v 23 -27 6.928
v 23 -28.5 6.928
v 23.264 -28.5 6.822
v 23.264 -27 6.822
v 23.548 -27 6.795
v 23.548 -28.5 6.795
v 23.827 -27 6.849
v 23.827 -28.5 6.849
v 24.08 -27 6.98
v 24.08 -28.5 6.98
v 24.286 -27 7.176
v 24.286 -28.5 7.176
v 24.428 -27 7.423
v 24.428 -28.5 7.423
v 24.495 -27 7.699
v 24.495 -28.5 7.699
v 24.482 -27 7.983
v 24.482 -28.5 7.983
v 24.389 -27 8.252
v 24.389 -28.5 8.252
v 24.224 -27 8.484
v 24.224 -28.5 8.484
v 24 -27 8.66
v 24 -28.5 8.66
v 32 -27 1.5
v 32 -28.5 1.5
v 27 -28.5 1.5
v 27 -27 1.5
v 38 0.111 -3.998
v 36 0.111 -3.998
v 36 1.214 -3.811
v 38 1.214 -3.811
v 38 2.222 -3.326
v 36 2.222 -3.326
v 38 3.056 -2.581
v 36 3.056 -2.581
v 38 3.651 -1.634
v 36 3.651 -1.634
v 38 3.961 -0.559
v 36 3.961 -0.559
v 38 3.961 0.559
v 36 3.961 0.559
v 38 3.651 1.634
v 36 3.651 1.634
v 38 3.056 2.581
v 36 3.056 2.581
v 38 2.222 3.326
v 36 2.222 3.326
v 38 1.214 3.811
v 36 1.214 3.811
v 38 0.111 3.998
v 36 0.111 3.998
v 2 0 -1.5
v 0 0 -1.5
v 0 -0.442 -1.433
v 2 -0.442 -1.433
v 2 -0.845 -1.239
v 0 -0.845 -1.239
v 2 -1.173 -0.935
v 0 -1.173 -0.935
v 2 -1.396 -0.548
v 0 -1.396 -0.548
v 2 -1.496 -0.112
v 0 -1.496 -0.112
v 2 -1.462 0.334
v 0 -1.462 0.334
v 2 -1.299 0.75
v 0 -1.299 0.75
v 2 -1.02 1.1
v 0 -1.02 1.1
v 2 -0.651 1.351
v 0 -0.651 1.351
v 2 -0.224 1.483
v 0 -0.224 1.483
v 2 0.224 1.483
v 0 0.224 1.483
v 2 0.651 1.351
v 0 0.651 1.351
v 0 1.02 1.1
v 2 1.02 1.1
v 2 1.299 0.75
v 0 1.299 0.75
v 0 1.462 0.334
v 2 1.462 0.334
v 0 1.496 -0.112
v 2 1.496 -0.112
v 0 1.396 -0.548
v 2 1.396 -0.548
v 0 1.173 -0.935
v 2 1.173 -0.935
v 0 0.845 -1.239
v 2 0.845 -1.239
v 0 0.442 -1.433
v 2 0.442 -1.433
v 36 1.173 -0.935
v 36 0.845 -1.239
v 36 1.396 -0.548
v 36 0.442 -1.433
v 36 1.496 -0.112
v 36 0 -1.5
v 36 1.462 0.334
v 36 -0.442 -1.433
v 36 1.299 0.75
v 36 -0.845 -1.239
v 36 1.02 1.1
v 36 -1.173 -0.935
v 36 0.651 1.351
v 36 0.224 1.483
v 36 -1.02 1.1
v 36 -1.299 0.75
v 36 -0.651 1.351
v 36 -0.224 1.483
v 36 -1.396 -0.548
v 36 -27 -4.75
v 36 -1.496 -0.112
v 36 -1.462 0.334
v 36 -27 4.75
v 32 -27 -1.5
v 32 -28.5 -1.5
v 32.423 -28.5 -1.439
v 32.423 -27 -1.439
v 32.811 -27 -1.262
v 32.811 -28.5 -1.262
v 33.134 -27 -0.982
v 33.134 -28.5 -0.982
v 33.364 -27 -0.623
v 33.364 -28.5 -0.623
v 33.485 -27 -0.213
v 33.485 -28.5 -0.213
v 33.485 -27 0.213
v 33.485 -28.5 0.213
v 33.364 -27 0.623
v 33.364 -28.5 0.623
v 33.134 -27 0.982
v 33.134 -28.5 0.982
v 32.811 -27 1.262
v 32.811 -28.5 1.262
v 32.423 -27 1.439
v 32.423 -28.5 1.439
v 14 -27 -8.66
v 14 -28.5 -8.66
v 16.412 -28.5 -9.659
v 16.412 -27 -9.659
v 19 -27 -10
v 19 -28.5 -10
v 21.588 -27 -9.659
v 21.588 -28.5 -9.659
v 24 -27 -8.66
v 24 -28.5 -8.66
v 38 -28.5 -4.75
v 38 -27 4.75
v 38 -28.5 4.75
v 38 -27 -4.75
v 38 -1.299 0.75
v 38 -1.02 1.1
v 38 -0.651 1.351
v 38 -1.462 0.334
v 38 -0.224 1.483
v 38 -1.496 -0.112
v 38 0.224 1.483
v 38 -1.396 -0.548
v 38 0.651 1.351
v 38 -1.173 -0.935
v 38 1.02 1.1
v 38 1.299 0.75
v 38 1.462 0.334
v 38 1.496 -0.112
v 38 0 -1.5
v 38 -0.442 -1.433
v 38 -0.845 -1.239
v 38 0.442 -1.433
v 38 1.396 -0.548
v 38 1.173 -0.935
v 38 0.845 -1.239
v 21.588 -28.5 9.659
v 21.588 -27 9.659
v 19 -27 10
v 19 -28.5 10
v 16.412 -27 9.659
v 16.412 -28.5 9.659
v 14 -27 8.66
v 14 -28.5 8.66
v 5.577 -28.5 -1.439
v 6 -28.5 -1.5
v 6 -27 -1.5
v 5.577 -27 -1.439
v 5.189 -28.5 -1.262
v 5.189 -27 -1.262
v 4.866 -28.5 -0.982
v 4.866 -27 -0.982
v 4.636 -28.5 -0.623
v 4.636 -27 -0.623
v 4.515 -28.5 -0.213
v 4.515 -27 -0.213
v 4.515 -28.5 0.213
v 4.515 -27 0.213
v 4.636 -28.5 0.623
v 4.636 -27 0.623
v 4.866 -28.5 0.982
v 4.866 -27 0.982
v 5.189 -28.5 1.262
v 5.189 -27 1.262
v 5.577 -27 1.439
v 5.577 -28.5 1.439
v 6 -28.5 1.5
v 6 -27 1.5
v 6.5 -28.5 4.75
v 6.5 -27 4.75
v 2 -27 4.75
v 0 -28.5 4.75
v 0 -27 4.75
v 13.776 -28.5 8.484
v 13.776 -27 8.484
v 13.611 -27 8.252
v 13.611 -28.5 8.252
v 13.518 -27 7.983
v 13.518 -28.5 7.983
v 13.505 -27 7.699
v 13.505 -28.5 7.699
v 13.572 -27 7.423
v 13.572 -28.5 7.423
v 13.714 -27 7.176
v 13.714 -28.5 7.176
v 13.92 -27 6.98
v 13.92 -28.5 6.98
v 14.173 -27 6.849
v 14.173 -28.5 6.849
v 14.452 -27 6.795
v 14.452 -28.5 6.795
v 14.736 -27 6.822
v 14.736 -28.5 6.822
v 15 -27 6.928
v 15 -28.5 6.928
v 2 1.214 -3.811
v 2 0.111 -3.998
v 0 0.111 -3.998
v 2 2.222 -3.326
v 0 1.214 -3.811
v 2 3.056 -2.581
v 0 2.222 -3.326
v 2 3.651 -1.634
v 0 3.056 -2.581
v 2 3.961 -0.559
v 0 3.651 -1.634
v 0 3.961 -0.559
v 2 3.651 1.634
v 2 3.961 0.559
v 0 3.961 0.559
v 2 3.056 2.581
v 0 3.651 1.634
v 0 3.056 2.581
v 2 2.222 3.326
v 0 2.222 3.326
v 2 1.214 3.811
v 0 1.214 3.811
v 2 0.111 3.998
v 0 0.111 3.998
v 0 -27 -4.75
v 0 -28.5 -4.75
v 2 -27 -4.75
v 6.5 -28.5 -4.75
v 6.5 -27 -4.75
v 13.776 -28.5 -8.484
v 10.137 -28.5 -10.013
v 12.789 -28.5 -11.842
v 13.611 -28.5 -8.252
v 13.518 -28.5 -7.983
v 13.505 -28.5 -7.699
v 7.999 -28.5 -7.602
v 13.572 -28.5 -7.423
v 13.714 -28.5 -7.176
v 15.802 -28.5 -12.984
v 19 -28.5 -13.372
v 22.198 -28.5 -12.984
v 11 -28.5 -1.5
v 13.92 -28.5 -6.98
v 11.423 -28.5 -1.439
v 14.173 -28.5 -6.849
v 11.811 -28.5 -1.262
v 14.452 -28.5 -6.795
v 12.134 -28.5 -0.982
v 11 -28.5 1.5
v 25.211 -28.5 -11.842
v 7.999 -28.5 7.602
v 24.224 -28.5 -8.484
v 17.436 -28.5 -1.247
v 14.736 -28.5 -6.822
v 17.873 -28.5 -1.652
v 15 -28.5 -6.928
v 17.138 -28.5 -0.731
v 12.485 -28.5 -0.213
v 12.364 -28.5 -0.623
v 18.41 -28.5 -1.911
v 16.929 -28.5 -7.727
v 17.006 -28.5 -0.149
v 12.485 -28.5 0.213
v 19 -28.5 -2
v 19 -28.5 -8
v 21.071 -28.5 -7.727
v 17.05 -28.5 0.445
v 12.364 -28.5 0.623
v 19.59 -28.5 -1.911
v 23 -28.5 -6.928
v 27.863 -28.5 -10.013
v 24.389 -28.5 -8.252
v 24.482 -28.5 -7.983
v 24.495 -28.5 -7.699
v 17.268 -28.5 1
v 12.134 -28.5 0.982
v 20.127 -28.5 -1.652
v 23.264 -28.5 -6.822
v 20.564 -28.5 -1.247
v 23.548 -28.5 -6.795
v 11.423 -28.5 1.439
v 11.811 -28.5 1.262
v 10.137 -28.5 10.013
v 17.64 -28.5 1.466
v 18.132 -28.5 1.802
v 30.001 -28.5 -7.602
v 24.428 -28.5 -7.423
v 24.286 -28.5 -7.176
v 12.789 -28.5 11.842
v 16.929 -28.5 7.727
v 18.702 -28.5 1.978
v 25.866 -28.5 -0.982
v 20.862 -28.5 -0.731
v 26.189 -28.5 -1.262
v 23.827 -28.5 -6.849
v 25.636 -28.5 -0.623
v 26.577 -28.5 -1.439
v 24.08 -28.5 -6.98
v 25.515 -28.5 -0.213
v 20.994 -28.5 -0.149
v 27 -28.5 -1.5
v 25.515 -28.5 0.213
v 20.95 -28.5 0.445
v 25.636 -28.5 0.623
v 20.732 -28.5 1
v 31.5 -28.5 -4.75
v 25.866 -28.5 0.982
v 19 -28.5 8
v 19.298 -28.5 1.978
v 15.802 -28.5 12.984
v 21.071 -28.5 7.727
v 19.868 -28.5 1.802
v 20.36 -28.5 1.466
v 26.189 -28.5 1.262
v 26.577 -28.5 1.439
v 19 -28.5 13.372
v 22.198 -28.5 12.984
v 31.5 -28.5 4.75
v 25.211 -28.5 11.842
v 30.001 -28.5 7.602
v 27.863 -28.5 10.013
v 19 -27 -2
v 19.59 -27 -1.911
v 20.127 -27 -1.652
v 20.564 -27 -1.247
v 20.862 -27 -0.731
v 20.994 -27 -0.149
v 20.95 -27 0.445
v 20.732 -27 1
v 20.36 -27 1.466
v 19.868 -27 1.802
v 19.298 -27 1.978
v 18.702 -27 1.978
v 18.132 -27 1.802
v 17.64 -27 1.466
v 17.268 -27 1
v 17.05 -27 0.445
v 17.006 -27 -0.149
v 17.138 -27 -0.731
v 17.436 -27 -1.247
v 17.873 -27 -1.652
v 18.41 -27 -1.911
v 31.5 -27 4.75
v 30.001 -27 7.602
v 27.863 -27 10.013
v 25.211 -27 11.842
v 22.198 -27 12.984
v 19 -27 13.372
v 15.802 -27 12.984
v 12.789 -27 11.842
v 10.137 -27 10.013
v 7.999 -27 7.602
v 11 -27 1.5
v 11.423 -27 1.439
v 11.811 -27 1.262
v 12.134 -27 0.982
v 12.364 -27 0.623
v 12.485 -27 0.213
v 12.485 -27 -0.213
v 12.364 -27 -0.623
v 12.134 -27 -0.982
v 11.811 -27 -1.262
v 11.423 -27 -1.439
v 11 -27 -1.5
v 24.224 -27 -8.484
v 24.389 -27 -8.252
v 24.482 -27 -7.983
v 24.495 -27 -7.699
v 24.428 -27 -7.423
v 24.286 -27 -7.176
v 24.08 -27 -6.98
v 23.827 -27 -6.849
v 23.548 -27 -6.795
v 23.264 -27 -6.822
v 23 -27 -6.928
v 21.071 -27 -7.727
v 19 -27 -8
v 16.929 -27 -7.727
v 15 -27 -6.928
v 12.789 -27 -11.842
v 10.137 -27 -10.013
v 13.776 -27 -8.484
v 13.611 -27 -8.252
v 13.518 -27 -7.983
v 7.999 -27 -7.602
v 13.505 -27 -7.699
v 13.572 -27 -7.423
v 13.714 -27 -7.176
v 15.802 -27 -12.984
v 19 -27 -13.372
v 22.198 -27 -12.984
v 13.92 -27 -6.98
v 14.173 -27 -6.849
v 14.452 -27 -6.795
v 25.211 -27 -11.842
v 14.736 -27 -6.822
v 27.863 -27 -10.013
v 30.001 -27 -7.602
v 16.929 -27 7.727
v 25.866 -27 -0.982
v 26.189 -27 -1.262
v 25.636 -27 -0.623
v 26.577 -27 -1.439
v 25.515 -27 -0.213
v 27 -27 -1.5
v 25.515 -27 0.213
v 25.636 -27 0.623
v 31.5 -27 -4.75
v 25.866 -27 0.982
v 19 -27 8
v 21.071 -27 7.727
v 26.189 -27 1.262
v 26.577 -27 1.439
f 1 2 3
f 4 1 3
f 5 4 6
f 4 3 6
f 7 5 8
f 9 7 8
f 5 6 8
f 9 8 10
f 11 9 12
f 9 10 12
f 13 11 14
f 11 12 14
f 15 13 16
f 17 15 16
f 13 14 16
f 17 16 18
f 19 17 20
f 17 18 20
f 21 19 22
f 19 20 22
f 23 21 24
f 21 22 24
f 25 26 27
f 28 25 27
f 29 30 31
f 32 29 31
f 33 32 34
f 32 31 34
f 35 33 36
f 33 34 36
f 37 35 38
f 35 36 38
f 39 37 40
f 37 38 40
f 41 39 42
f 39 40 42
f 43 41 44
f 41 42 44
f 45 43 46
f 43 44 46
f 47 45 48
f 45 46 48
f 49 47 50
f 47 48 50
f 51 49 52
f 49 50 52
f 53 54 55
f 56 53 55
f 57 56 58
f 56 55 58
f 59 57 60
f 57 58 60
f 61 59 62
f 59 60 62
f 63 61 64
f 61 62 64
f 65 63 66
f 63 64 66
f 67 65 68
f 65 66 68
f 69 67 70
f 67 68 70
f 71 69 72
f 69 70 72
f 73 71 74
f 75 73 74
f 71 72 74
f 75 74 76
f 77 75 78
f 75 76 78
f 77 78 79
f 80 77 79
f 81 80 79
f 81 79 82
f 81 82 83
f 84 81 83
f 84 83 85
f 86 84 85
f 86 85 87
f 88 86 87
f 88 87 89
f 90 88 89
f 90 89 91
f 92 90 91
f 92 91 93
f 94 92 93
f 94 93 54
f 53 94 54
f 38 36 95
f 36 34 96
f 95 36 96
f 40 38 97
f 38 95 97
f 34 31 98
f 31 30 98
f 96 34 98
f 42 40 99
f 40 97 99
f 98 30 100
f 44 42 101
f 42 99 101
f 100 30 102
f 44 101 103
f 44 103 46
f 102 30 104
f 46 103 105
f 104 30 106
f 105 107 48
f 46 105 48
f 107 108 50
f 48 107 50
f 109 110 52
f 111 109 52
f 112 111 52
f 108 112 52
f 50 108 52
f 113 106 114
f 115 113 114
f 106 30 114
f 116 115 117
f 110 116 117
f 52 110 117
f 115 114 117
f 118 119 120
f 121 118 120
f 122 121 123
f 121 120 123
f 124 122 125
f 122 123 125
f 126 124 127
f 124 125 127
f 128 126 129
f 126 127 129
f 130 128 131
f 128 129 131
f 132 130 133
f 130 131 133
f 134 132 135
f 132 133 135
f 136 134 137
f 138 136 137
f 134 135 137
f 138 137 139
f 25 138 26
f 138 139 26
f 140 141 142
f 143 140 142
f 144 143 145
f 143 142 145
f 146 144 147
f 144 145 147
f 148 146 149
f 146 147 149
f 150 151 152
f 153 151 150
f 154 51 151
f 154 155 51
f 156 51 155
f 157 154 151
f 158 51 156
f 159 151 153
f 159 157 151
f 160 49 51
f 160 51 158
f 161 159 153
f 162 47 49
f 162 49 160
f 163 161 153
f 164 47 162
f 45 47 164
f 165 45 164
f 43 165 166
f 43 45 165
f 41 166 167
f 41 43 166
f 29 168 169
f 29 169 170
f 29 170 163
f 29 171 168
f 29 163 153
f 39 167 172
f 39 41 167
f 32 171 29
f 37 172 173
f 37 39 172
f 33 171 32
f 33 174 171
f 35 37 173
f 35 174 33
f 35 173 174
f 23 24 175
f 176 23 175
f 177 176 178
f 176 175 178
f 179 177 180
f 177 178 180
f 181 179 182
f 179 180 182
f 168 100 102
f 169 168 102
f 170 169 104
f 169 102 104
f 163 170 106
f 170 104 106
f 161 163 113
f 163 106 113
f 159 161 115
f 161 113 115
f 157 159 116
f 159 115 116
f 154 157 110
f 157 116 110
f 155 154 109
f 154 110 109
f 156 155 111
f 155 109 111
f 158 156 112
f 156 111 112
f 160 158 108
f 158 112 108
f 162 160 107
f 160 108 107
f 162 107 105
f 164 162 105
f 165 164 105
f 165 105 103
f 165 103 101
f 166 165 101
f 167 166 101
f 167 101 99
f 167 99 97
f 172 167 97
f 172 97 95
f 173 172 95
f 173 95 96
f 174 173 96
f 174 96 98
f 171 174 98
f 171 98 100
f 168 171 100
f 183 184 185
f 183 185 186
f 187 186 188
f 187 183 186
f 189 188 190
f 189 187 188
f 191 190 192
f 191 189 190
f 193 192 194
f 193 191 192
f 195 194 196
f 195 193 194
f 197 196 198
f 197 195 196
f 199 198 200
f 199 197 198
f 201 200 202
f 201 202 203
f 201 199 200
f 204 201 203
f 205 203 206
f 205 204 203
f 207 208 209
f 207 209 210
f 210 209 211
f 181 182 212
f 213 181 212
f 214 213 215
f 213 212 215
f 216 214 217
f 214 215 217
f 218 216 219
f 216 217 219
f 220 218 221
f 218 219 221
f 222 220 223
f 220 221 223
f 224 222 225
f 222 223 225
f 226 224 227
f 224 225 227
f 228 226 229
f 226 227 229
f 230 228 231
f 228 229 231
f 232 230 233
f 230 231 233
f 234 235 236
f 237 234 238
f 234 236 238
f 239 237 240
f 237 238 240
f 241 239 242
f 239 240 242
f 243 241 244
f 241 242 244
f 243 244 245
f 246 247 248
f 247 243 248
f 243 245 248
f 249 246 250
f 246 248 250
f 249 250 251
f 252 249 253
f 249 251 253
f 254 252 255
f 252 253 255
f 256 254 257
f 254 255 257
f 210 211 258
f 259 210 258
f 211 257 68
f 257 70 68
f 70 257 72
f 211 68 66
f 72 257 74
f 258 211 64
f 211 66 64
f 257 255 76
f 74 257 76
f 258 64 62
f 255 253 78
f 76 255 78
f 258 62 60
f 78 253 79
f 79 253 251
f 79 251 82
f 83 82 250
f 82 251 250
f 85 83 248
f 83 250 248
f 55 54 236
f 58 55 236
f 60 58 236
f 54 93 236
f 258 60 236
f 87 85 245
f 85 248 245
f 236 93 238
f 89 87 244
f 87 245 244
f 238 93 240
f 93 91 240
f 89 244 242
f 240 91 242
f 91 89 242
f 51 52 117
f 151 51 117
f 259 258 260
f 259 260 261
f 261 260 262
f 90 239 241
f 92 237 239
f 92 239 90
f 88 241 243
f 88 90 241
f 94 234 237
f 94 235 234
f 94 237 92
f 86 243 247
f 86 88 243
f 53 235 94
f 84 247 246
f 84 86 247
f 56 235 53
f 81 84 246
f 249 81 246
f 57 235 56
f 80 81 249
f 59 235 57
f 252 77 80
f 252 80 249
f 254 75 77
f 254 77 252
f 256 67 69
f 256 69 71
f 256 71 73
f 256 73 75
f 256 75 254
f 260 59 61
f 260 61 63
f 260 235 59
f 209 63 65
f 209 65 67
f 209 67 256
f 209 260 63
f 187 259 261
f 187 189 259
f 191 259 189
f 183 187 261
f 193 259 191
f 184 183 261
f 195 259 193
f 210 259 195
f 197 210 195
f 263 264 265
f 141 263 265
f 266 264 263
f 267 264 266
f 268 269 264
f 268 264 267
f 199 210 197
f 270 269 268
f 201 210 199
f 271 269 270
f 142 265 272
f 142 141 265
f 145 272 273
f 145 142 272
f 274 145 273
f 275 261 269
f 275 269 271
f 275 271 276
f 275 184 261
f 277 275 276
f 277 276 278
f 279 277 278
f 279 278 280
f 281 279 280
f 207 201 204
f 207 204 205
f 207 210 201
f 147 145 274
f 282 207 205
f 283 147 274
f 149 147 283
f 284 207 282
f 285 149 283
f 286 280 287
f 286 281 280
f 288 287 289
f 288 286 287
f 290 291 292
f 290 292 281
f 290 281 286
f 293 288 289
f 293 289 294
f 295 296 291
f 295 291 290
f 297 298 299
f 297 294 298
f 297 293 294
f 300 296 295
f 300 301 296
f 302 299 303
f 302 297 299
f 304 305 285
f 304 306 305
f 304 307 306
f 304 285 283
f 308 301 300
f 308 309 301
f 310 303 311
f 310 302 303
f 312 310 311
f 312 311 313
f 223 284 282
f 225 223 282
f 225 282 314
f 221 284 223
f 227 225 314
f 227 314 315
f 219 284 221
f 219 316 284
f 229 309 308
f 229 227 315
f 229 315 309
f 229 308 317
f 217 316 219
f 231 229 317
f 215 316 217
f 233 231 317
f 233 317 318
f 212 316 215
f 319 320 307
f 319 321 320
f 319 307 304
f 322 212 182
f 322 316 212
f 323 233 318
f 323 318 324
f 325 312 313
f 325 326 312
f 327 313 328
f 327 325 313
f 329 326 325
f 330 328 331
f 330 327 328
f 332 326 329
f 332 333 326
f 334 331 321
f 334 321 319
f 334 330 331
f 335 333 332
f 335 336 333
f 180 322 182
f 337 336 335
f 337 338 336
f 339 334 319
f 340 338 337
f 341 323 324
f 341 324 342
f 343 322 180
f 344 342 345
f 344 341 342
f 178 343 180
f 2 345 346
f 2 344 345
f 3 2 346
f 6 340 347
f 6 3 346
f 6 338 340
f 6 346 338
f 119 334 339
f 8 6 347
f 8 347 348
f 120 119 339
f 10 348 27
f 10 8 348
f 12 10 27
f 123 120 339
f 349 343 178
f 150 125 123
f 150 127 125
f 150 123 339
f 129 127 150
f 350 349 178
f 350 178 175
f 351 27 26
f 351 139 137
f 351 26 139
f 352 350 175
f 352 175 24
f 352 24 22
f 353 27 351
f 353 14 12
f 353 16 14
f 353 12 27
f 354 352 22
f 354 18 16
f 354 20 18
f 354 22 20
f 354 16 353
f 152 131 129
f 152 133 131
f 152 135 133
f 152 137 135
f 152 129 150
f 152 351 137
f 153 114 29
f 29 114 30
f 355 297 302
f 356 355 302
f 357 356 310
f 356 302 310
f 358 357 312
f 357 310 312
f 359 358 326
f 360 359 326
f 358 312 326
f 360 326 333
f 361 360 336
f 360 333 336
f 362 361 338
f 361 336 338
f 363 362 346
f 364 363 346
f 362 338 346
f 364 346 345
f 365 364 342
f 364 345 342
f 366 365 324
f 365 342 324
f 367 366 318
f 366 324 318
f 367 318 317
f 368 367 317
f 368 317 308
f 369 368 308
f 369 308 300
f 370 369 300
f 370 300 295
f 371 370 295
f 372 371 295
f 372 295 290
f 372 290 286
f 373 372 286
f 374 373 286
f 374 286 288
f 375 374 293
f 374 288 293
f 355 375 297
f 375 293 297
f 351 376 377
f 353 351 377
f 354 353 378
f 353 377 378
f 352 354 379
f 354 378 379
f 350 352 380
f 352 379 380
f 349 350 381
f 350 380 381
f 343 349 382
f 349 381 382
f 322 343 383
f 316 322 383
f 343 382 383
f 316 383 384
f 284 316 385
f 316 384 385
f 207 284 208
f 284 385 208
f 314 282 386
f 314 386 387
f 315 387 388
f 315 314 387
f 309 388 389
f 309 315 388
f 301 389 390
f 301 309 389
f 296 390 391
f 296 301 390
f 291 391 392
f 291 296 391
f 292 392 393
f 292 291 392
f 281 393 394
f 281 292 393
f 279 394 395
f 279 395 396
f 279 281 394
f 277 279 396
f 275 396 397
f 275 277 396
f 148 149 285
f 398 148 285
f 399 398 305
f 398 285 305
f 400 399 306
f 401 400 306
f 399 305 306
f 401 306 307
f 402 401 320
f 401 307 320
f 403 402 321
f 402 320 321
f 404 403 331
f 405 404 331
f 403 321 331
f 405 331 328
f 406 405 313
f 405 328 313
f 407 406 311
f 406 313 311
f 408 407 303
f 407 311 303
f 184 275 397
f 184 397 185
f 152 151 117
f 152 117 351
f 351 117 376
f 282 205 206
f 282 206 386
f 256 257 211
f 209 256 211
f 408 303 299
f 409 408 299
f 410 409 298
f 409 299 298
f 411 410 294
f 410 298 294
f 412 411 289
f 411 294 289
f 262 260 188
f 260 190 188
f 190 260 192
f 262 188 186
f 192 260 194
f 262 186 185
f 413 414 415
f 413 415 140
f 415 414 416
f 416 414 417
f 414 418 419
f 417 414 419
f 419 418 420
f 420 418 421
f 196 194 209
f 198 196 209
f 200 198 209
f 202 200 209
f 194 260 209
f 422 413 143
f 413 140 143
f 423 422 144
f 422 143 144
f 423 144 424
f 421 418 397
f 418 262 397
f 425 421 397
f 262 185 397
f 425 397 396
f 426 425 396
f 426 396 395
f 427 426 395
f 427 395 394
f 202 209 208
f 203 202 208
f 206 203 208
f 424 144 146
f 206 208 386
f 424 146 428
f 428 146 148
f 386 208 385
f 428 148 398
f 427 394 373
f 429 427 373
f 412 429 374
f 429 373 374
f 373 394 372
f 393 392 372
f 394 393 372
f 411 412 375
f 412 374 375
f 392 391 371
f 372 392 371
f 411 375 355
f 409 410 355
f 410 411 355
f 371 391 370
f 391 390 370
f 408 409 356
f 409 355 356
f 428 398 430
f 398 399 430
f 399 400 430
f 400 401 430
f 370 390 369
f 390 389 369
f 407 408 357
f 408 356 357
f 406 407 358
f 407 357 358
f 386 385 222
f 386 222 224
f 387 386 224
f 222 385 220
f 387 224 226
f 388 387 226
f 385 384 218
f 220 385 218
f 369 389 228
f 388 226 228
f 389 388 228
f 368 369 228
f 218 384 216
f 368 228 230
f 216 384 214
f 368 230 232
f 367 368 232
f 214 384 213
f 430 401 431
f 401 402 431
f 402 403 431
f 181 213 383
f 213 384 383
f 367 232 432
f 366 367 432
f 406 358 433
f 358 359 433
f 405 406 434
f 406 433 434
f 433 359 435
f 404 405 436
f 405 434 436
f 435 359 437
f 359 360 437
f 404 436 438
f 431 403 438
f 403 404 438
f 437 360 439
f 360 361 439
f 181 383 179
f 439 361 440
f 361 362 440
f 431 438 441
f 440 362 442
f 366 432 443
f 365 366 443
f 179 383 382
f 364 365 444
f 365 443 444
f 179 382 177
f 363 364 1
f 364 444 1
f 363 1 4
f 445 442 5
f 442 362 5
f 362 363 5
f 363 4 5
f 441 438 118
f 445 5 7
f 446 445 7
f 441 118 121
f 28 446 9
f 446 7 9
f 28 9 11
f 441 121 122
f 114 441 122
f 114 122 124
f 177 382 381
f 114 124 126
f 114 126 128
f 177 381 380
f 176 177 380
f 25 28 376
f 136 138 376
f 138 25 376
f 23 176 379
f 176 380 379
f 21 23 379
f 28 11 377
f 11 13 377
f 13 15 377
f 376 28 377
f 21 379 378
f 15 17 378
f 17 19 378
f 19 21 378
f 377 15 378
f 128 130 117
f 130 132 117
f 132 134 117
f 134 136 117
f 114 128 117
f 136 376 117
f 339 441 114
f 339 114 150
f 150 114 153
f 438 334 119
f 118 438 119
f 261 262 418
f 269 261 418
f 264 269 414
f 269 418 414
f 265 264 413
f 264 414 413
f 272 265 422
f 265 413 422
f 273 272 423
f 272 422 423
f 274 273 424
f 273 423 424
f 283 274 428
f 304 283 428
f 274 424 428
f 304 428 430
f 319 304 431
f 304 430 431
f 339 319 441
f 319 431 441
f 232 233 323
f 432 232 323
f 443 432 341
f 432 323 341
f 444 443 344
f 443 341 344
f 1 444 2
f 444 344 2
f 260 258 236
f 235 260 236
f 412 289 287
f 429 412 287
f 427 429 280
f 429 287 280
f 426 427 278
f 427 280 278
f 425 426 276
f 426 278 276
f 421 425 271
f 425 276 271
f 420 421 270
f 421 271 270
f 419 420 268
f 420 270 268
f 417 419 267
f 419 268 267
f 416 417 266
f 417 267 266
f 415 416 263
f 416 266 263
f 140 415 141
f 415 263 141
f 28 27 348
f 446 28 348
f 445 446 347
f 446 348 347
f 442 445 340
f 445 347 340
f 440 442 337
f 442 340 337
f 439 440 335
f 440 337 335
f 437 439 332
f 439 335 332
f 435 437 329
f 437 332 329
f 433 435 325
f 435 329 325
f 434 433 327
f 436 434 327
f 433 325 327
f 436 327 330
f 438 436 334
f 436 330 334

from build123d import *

# Parameters (mm, degrees)
EXTRUDE_1_DEPTH     = 38
EXTRUDE_2_DEPTH     = 1.5
SKETCH_3_W          = 34
SKETCH_3_H          = 9.5
CUT_EXTRUDE_1_DEPTH = 51.831215803
SKETCH_6_R          = 2
CUT_EXTRUDE_2_DEPTH = 1.5
CUT_EXTRUDE_3_REACH = 51.346
SKETCH_7_R          = 1.5


with BuildPart() as part:
    # 草图1 → 凸台-拉伸1 (new body)
    with BuildSketch(Plane(origin=(0, 0, 0), x_dir=(0, 0, -1), z_dir=(1, 0, 0))):
        with BuildLine():
            Line((-3.998463992, 0.110840888), (-4.75, -27))
            Line((-4.75, -27), (4.75, -27))
            Line((4.75, -27), (3.998463992, 0.110840888))
            ThreePointArc((3.998463992, 0.110840888), (0, 4), (-3.998463992, 0.110840888))
        make_face()
    extrude(amount=EXTRUDE_1_DEPTH)

    # 草图4 → 凸台-拉伸2 (add)
    with BuildSketch(Plane.XZ.offset(27)):
        with BuildLine():
            Line((6.5, 4.75), (0, 4.75))
            Line((0, 4.75), (0, -4.75))
            Line((0, -4.75), (6.5, -4.75))
            ThreePointArc((6.5, -4.75), (19, -13.37207912), (31.5, -4.75))
            Line((31.5, -4.75), (38, -4.75))
            Line((38, -4.75), (38, 4.75))
            Line((38, 4.75), (31.5, 4.75))
            ThreePointArc((31.5, 4.75), (19, 13.37207912), (6.5, 4.75))
        make_face()
    extrude(amount=EXTRUDE_2_DEPTH)

    # 草图3 → 切除-拉伸1 (cut, through all)
    with BuildSketch(Plane.XZ.offset(27)):
        with Locations((19, 0)):
            Rectangle(SKETCH_3_W, SKETCH_3_H)
    extrude(amount=-CUT_EXTRUDE_1_DEPTH, mode=Mode.SUBTRACT)

    # 草图6 → 切除-拉伸2 (cut)
    with BuildSketch(Plane.XZ.offset(28.5)):
        with Locations(Location((19, 0, 0), (0, 0, 270))):
            Circle(SKETCH_6_R)
        with BuildLine():
            Line((6, 1.5), (11, 1.5))
            ThreePointArc((11, 1.5), (12.5, 0), (11, -1.5))
            Line((11, -1.5), (6, -1.5))
            ThreePointArc((6, -1.5), (4.5, 0), (6, 1.5))
        make_face()
        with BuildLine():
            Line((32, 1.5), (27, 1.5))
            ThreePointArc((27, 1.5), (25.5, 0), (27, -1.5))
            Line((27, -1.5), (32, -1.5))
            ThreePointArc((32, -1.5), (33.5, 0), (32, 1.5))
        make_face()
        with BuildLine():
            ThreePointArc((24, 8.660254038), (19, 10), (14, 8.660254038))
            ThreePointArc((14, 8.660254038), (13.633974596, 7.294228634), (15, 6.92820323))
            ThreePointArc((15, 6.92820323), (19, 8), (23, 6.92820323))
            ThreePointArc((23, 6.92820323), (24.366025404, 7.294228634), (24, 8.660254038))
        make_face()
        with BuildLine():
            ThreePointArc((24, -8.660254038), (24.366025404, -7.294228634), (23, -6.92820323))
            ThreePointArc((23, -6.92820323), (19, -8), (15, -6.92820323))
            ThreePointArc((15, -6.92820323), (13.633974596, -7.294228634), (14, -8.660254038))
            ThreePointArc((14, -8.660254038), (19, -10), (24, -8.660254038))
        make_face()
    extrude(amount=-CUT_EXTRUDE_2_DEPTH, mode=Mode.SUBTRACT)

    # 切除-拉伸3: up to this face of the body (flat: up to its plane)
    cut_extrude_3_end = Plane(part.part.faces().sort_by_distance((38, -13.180930024, 0))[0])
    # 草图7 → 切除-拉伸3 (cut, up to the picked face)
    with BuildSketch(Plane.ZY, mode=Mode.PRIVATE) as cut_extrude_3_sk1:
        with Locations(Location((0, 0, 0), (0, 0, 180))):
            Circle(SKETCH_7_R)
    cut_extrude_3_tool1 = split(extrude(cut_extrude_3_sk1.sketch, amount=-CUT_EXTRUDE_3_REACH, mode=Mode.PRIVATE), bisect_by=cut_extrude_3_end, keep=Keep.BOTH, mode=Mode.PRIVATE)
    add(cut_extrude_3_tool1.solids().sort_by(Axis((0, 0, 0), (1, 0, 0)))[0], mode=Mode.SUBTRACT)


solid = part.part
